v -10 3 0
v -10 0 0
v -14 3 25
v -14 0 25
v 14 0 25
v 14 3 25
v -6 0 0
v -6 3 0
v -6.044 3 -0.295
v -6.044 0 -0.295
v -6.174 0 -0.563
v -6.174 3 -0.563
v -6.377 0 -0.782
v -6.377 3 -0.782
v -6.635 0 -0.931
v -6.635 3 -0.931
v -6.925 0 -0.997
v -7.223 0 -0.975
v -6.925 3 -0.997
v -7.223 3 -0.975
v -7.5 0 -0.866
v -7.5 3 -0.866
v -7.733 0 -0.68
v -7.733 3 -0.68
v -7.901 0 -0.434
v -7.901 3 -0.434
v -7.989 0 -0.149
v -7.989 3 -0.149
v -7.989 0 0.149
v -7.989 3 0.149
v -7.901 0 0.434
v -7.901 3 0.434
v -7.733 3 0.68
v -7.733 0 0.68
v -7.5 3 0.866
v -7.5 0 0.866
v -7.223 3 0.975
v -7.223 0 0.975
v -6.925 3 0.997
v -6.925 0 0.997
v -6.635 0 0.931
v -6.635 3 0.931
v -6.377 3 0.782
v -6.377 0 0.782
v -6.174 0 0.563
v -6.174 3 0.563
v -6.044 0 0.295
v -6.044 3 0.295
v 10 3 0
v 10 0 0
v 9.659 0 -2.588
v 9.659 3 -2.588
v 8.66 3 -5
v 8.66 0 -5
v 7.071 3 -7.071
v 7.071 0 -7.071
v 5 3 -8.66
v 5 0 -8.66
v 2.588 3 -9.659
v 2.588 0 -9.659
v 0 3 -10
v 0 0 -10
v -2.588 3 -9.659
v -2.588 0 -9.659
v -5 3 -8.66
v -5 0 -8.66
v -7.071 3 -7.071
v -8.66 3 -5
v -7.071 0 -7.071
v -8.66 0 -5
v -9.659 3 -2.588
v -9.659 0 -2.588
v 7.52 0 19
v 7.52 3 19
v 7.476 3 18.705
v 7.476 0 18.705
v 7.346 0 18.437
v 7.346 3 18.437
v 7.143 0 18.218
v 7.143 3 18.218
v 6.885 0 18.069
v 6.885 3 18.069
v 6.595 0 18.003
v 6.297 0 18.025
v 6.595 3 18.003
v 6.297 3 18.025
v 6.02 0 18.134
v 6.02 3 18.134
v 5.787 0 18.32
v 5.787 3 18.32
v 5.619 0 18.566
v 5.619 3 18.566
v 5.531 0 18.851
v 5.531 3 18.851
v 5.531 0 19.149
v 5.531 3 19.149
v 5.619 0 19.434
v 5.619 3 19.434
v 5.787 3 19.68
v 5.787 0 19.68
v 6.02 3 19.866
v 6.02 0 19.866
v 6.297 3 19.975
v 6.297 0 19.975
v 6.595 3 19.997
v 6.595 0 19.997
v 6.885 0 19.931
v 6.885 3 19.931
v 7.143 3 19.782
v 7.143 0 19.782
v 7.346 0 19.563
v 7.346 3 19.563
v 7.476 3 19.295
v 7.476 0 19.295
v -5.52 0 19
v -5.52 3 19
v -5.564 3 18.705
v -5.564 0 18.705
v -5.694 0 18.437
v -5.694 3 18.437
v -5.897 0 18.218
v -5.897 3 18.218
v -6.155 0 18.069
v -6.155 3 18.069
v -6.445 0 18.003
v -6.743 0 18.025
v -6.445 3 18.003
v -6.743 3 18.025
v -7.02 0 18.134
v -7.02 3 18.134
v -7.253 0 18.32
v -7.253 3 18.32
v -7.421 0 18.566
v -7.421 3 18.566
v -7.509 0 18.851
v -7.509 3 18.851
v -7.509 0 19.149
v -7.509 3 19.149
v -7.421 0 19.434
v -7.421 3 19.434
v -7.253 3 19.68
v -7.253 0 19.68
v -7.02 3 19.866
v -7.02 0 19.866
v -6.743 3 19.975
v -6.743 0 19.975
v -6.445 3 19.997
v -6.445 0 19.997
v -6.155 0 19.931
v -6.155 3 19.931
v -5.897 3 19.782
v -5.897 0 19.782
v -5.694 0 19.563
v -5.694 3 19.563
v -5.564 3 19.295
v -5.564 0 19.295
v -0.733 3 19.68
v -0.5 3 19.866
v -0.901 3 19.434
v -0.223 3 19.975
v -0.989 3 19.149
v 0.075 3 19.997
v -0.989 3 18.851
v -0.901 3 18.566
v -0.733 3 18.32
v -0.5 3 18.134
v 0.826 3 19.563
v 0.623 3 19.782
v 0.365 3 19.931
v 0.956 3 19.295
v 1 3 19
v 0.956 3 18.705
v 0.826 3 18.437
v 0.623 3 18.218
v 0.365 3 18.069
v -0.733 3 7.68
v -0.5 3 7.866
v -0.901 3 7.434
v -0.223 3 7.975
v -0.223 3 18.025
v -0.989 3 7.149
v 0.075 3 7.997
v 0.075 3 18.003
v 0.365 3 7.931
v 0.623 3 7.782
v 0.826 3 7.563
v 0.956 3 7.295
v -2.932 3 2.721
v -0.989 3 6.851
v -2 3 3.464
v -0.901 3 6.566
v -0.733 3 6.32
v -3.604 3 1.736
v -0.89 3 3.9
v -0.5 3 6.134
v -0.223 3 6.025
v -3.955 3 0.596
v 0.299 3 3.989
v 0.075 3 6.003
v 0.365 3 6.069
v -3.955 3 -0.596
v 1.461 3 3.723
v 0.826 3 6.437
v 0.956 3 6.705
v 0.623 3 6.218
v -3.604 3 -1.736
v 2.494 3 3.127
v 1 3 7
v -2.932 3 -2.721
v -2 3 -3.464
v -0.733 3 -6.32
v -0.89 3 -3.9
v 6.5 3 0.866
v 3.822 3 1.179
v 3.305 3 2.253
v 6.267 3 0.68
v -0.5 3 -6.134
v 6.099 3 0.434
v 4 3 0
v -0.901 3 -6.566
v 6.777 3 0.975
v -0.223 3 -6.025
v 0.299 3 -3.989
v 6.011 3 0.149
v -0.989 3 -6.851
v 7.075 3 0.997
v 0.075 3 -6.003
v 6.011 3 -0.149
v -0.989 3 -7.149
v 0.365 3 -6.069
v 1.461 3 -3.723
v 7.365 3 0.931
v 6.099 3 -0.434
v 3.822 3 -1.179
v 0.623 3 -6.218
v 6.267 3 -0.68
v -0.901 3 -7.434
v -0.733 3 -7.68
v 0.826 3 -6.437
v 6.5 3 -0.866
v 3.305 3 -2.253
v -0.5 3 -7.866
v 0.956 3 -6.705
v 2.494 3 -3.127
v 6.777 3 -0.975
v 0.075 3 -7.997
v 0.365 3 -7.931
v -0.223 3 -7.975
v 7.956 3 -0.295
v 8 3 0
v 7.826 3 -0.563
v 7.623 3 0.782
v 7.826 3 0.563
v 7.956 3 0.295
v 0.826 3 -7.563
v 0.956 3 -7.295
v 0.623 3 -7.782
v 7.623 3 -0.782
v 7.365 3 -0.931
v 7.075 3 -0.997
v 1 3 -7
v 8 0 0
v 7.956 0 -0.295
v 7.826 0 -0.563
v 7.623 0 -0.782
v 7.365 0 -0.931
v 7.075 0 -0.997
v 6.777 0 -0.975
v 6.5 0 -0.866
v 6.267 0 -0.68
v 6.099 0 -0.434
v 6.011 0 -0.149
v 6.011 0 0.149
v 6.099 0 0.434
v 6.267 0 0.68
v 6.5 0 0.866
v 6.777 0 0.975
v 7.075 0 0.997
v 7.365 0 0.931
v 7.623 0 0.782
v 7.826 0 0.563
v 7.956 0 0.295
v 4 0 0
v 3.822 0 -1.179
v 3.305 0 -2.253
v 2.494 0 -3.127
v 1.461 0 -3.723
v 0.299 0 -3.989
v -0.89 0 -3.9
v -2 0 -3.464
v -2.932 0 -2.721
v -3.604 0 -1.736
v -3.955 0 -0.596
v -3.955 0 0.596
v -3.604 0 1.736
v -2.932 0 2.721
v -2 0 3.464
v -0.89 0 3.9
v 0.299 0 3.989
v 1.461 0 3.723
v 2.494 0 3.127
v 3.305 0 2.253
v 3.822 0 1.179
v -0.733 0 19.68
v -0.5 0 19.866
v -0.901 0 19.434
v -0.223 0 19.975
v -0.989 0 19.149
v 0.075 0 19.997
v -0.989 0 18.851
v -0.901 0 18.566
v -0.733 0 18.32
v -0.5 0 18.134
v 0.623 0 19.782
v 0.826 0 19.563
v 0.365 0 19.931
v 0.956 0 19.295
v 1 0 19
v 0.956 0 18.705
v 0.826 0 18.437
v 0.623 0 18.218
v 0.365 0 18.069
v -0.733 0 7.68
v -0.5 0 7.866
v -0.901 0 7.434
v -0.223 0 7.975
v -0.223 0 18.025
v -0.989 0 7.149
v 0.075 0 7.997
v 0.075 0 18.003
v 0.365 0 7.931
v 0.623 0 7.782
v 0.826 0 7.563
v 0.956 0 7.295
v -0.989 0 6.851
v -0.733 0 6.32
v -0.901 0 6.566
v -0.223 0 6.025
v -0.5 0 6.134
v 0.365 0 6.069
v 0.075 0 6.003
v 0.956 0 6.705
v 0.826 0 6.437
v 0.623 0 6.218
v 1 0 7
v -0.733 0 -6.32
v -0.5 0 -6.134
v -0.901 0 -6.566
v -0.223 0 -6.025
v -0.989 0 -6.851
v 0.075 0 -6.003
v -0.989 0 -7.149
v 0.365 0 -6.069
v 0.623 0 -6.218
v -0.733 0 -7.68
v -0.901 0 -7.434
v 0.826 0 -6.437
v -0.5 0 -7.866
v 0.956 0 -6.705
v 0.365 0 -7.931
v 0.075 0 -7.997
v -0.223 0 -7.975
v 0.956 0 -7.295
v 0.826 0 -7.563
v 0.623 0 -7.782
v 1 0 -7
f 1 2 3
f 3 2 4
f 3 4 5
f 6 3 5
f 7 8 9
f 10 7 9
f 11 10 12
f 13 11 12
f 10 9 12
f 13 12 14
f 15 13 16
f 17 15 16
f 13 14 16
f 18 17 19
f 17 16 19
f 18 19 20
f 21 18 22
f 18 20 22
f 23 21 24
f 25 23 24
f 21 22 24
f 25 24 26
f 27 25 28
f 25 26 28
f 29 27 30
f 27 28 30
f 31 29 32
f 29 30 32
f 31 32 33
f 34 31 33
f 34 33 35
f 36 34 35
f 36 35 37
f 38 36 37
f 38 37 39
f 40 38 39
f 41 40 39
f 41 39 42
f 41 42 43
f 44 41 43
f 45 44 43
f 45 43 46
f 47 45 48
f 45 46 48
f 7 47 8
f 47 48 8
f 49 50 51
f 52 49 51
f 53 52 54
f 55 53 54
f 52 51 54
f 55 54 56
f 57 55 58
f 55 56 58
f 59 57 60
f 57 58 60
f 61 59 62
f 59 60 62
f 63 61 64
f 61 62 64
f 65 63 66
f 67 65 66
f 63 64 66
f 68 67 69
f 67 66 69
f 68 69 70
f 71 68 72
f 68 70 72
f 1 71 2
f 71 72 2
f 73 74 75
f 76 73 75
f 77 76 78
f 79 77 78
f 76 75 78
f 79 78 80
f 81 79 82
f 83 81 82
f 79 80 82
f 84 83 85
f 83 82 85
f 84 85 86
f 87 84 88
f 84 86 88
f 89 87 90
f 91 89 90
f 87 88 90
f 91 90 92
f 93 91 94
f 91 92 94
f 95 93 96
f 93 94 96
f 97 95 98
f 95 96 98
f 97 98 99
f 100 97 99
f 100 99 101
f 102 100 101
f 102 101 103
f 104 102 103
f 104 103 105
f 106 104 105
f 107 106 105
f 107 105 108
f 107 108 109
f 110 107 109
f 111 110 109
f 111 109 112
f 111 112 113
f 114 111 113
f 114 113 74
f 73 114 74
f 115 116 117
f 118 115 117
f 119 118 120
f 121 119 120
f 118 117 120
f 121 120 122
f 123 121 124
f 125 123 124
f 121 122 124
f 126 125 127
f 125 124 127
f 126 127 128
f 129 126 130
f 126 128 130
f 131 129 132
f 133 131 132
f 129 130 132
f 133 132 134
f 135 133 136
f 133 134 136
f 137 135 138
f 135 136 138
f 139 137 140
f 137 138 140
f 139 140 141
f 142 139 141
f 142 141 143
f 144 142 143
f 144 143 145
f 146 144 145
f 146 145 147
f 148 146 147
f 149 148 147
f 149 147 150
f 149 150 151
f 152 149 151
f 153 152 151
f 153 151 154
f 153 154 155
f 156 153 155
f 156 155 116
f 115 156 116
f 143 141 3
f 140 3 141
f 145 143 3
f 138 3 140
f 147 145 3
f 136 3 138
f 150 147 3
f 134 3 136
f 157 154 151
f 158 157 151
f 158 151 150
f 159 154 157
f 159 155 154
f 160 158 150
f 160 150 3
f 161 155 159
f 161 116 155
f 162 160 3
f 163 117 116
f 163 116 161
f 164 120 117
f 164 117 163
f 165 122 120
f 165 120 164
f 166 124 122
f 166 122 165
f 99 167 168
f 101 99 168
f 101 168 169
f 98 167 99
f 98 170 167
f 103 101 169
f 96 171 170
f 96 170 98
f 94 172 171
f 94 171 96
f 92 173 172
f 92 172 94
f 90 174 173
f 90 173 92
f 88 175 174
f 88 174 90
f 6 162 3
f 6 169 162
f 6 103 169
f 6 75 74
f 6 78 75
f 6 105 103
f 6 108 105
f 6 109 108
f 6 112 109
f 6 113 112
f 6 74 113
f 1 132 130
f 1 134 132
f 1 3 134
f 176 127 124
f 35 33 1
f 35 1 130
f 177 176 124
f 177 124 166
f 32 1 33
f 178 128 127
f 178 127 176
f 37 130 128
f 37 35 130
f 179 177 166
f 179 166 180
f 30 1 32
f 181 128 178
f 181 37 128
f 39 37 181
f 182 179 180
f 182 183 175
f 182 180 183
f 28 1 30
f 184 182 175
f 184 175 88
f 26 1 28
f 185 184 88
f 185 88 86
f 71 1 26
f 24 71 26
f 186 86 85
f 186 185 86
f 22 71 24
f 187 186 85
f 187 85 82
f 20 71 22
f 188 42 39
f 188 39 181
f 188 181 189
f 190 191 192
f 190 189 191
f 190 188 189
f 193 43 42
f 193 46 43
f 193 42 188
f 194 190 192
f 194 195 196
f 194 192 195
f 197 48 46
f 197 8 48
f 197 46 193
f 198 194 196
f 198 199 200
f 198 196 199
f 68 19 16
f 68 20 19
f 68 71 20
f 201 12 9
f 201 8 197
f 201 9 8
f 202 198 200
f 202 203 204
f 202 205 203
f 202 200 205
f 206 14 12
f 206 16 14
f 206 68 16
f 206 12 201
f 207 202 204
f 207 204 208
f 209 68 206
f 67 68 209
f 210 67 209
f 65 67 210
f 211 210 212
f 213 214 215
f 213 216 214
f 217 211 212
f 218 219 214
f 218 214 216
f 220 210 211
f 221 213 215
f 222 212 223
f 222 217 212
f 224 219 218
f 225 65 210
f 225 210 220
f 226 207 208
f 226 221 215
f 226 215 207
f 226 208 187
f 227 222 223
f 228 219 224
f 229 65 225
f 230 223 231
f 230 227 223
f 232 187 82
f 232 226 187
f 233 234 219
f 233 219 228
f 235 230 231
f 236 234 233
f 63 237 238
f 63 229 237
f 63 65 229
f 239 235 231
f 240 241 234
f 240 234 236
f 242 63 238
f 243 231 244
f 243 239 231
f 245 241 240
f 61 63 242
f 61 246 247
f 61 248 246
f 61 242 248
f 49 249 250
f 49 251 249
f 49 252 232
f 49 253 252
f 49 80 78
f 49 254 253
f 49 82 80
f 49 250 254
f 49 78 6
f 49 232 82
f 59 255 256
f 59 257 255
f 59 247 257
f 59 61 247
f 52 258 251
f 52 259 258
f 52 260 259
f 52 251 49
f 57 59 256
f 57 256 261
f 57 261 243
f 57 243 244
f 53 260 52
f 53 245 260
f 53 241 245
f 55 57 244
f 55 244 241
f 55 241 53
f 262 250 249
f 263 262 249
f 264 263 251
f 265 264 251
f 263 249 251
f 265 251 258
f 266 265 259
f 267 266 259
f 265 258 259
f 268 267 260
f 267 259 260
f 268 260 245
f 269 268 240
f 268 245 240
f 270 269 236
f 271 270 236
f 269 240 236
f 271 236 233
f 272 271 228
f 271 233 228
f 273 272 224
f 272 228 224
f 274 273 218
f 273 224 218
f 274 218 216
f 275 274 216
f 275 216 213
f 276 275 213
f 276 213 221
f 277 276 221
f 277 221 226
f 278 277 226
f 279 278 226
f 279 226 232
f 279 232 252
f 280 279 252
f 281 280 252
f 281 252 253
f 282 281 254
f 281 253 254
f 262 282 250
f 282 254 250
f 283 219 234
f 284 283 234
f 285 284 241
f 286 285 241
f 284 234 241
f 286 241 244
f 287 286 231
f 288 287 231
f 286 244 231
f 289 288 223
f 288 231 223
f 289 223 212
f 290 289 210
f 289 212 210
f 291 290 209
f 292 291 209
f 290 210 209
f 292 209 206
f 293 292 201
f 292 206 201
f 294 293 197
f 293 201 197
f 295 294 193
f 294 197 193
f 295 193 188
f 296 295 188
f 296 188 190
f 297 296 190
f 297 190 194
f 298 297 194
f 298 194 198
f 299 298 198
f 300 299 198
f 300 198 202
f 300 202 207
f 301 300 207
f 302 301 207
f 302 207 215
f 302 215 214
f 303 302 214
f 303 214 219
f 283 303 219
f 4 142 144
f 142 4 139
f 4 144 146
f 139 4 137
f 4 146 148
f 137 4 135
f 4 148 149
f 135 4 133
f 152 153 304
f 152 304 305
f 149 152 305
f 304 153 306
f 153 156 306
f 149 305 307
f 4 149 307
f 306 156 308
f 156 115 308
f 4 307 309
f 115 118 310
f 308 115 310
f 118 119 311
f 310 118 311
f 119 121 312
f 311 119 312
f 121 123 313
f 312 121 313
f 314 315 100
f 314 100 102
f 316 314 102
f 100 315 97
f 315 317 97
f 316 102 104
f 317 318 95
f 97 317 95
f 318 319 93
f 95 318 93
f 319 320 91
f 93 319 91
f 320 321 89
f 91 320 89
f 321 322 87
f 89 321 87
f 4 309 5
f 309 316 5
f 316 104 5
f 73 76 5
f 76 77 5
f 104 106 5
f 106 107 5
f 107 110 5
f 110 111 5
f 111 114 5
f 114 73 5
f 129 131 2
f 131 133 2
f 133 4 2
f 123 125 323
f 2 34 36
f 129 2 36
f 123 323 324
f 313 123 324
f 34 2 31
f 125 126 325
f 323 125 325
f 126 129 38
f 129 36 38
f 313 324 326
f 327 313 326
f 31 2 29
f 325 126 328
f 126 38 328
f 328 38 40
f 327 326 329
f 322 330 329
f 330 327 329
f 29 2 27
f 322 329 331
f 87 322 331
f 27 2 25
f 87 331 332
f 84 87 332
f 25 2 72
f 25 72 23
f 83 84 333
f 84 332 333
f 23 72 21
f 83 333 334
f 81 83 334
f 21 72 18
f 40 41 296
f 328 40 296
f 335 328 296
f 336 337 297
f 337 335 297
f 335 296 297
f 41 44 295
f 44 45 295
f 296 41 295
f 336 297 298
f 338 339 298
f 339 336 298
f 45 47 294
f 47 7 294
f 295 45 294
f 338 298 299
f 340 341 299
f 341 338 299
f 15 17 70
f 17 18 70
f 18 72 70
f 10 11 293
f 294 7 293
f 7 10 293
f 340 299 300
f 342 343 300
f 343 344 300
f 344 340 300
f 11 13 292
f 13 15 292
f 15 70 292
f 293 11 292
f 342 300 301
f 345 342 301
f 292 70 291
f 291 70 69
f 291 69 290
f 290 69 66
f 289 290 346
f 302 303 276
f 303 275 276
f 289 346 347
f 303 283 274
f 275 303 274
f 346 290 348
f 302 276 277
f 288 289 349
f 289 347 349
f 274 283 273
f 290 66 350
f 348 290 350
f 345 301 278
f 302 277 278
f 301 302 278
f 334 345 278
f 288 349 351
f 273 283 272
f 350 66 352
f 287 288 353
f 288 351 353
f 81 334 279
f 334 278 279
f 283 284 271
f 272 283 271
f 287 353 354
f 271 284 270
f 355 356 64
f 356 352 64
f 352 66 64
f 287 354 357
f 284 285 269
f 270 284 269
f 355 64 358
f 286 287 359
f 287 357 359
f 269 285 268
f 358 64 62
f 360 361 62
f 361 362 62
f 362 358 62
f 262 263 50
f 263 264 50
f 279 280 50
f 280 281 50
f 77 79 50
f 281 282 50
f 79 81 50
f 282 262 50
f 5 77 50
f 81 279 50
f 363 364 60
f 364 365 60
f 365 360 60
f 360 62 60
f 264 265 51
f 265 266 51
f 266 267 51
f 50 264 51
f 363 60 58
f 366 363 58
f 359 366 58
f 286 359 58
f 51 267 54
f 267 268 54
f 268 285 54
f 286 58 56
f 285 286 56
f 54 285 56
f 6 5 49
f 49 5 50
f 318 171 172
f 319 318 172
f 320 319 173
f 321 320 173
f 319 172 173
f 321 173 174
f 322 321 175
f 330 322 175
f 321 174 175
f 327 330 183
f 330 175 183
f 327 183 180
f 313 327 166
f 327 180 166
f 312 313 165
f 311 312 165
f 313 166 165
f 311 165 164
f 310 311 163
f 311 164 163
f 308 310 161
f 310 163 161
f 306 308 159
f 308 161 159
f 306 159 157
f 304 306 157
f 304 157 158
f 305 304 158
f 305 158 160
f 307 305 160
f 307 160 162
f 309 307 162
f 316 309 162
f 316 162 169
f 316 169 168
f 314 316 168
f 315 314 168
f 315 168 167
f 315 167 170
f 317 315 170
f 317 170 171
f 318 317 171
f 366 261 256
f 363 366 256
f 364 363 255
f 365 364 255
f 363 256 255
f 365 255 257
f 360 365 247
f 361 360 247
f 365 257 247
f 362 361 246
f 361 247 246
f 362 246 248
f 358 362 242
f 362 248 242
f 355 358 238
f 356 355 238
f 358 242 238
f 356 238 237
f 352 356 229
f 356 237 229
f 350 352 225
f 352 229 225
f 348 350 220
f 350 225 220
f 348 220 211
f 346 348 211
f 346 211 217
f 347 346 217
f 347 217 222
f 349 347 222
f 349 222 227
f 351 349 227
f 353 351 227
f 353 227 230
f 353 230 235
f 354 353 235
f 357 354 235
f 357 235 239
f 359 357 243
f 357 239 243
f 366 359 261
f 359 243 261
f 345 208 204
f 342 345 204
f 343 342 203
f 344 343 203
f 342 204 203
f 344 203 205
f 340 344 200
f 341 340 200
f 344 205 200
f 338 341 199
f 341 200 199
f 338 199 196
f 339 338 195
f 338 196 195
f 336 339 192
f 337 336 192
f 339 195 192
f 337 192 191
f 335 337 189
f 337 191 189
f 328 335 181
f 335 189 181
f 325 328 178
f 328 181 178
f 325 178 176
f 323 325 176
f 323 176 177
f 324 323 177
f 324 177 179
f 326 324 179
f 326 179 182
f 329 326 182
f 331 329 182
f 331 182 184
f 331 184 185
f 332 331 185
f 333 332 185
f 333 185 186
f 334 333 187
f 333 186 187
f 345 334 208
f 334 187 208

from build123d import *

# Parameters (mm, degrees)
BOSS_EXTRUDE1_DEPTH = 3
SKETCH2_R           = 4
CUT_EXTRUDE1_DEPTH  = 13
SKETCH3_R           = 1
CUT_EXTRUDE2_DEPTH  = 13
SKETCH4_R           = 1
CUT_EXTRUDE3_DEPTH  = 3


with BuildPart() as part:
    # Sketch1 → Boss-Extrude1 (new body)
    with BuildSketch(Plane(origin=(0, 0, 0), x_dir=(1, 0, 0), z_dir=(0, 1, 0))):
        with BuildLine():
            Line((-10, 0), (-14, -25))
            Line((-14, -25), (14, -25))
            Line((14, -25), (10, 0))
            ThreePointArc((10, 0), (0, 10), (-10, 0))
        make_face()
    extrude(amount=BOSS_EXTRUDE1_DEPTH)

    # Sketch2 → Cut-Extrude1 (cut)
    with BuildSketch(Plane(origin=(0, 3, 0), x_dir=(1, 0, 0), z_dir=(0, 1, 0))):
        Circle(SKETCH2_R)
    extrude(amount=-CUT_EXTRUDE1_DEPTH, mode=Mode.SUBTRACT)

    # Sketch3 → Cut-Extrude2 (cut)
    with BuildSketch(Plane(origin=(0, 3, 0), x_dir=(1, 0, 0), z_dir=(0, 1, 0))):
        with Locations((-6.52, -19)):
            Circle(SKETCH3_R)
        with Locations((6.52, -19)):
            Circle(SKETCH3_R)
        with Locations((0, -19)):
            Circle(SKETCH3_R)
    extrude(amount=-CUT_EXTRUDE2_DEPTH, mode=Mode.SUBTRACT)

    # Sketch4 → Cut-Extrude3 (cut)
    with BuildSketch(Plane(origin=(0, 3, 0), x_dir=(1, 0, 0), z_dir=(0, 1, 0))):
        with Locations((0, -7)):
            Circle(SKETCH4_R)
        with Locations((-7, 0)):
            Circle(SKETCH4_R)
        with Locations((0, 7)):
            Circle(SKETCH4_R)
        with Locations((7, 0)):
            Circle(SKETCH4_R)
    extrude(amount=-CUT_EXTRUDE3_DEPTH, mode=Mode.SUBTRACT)


solid = part.part
